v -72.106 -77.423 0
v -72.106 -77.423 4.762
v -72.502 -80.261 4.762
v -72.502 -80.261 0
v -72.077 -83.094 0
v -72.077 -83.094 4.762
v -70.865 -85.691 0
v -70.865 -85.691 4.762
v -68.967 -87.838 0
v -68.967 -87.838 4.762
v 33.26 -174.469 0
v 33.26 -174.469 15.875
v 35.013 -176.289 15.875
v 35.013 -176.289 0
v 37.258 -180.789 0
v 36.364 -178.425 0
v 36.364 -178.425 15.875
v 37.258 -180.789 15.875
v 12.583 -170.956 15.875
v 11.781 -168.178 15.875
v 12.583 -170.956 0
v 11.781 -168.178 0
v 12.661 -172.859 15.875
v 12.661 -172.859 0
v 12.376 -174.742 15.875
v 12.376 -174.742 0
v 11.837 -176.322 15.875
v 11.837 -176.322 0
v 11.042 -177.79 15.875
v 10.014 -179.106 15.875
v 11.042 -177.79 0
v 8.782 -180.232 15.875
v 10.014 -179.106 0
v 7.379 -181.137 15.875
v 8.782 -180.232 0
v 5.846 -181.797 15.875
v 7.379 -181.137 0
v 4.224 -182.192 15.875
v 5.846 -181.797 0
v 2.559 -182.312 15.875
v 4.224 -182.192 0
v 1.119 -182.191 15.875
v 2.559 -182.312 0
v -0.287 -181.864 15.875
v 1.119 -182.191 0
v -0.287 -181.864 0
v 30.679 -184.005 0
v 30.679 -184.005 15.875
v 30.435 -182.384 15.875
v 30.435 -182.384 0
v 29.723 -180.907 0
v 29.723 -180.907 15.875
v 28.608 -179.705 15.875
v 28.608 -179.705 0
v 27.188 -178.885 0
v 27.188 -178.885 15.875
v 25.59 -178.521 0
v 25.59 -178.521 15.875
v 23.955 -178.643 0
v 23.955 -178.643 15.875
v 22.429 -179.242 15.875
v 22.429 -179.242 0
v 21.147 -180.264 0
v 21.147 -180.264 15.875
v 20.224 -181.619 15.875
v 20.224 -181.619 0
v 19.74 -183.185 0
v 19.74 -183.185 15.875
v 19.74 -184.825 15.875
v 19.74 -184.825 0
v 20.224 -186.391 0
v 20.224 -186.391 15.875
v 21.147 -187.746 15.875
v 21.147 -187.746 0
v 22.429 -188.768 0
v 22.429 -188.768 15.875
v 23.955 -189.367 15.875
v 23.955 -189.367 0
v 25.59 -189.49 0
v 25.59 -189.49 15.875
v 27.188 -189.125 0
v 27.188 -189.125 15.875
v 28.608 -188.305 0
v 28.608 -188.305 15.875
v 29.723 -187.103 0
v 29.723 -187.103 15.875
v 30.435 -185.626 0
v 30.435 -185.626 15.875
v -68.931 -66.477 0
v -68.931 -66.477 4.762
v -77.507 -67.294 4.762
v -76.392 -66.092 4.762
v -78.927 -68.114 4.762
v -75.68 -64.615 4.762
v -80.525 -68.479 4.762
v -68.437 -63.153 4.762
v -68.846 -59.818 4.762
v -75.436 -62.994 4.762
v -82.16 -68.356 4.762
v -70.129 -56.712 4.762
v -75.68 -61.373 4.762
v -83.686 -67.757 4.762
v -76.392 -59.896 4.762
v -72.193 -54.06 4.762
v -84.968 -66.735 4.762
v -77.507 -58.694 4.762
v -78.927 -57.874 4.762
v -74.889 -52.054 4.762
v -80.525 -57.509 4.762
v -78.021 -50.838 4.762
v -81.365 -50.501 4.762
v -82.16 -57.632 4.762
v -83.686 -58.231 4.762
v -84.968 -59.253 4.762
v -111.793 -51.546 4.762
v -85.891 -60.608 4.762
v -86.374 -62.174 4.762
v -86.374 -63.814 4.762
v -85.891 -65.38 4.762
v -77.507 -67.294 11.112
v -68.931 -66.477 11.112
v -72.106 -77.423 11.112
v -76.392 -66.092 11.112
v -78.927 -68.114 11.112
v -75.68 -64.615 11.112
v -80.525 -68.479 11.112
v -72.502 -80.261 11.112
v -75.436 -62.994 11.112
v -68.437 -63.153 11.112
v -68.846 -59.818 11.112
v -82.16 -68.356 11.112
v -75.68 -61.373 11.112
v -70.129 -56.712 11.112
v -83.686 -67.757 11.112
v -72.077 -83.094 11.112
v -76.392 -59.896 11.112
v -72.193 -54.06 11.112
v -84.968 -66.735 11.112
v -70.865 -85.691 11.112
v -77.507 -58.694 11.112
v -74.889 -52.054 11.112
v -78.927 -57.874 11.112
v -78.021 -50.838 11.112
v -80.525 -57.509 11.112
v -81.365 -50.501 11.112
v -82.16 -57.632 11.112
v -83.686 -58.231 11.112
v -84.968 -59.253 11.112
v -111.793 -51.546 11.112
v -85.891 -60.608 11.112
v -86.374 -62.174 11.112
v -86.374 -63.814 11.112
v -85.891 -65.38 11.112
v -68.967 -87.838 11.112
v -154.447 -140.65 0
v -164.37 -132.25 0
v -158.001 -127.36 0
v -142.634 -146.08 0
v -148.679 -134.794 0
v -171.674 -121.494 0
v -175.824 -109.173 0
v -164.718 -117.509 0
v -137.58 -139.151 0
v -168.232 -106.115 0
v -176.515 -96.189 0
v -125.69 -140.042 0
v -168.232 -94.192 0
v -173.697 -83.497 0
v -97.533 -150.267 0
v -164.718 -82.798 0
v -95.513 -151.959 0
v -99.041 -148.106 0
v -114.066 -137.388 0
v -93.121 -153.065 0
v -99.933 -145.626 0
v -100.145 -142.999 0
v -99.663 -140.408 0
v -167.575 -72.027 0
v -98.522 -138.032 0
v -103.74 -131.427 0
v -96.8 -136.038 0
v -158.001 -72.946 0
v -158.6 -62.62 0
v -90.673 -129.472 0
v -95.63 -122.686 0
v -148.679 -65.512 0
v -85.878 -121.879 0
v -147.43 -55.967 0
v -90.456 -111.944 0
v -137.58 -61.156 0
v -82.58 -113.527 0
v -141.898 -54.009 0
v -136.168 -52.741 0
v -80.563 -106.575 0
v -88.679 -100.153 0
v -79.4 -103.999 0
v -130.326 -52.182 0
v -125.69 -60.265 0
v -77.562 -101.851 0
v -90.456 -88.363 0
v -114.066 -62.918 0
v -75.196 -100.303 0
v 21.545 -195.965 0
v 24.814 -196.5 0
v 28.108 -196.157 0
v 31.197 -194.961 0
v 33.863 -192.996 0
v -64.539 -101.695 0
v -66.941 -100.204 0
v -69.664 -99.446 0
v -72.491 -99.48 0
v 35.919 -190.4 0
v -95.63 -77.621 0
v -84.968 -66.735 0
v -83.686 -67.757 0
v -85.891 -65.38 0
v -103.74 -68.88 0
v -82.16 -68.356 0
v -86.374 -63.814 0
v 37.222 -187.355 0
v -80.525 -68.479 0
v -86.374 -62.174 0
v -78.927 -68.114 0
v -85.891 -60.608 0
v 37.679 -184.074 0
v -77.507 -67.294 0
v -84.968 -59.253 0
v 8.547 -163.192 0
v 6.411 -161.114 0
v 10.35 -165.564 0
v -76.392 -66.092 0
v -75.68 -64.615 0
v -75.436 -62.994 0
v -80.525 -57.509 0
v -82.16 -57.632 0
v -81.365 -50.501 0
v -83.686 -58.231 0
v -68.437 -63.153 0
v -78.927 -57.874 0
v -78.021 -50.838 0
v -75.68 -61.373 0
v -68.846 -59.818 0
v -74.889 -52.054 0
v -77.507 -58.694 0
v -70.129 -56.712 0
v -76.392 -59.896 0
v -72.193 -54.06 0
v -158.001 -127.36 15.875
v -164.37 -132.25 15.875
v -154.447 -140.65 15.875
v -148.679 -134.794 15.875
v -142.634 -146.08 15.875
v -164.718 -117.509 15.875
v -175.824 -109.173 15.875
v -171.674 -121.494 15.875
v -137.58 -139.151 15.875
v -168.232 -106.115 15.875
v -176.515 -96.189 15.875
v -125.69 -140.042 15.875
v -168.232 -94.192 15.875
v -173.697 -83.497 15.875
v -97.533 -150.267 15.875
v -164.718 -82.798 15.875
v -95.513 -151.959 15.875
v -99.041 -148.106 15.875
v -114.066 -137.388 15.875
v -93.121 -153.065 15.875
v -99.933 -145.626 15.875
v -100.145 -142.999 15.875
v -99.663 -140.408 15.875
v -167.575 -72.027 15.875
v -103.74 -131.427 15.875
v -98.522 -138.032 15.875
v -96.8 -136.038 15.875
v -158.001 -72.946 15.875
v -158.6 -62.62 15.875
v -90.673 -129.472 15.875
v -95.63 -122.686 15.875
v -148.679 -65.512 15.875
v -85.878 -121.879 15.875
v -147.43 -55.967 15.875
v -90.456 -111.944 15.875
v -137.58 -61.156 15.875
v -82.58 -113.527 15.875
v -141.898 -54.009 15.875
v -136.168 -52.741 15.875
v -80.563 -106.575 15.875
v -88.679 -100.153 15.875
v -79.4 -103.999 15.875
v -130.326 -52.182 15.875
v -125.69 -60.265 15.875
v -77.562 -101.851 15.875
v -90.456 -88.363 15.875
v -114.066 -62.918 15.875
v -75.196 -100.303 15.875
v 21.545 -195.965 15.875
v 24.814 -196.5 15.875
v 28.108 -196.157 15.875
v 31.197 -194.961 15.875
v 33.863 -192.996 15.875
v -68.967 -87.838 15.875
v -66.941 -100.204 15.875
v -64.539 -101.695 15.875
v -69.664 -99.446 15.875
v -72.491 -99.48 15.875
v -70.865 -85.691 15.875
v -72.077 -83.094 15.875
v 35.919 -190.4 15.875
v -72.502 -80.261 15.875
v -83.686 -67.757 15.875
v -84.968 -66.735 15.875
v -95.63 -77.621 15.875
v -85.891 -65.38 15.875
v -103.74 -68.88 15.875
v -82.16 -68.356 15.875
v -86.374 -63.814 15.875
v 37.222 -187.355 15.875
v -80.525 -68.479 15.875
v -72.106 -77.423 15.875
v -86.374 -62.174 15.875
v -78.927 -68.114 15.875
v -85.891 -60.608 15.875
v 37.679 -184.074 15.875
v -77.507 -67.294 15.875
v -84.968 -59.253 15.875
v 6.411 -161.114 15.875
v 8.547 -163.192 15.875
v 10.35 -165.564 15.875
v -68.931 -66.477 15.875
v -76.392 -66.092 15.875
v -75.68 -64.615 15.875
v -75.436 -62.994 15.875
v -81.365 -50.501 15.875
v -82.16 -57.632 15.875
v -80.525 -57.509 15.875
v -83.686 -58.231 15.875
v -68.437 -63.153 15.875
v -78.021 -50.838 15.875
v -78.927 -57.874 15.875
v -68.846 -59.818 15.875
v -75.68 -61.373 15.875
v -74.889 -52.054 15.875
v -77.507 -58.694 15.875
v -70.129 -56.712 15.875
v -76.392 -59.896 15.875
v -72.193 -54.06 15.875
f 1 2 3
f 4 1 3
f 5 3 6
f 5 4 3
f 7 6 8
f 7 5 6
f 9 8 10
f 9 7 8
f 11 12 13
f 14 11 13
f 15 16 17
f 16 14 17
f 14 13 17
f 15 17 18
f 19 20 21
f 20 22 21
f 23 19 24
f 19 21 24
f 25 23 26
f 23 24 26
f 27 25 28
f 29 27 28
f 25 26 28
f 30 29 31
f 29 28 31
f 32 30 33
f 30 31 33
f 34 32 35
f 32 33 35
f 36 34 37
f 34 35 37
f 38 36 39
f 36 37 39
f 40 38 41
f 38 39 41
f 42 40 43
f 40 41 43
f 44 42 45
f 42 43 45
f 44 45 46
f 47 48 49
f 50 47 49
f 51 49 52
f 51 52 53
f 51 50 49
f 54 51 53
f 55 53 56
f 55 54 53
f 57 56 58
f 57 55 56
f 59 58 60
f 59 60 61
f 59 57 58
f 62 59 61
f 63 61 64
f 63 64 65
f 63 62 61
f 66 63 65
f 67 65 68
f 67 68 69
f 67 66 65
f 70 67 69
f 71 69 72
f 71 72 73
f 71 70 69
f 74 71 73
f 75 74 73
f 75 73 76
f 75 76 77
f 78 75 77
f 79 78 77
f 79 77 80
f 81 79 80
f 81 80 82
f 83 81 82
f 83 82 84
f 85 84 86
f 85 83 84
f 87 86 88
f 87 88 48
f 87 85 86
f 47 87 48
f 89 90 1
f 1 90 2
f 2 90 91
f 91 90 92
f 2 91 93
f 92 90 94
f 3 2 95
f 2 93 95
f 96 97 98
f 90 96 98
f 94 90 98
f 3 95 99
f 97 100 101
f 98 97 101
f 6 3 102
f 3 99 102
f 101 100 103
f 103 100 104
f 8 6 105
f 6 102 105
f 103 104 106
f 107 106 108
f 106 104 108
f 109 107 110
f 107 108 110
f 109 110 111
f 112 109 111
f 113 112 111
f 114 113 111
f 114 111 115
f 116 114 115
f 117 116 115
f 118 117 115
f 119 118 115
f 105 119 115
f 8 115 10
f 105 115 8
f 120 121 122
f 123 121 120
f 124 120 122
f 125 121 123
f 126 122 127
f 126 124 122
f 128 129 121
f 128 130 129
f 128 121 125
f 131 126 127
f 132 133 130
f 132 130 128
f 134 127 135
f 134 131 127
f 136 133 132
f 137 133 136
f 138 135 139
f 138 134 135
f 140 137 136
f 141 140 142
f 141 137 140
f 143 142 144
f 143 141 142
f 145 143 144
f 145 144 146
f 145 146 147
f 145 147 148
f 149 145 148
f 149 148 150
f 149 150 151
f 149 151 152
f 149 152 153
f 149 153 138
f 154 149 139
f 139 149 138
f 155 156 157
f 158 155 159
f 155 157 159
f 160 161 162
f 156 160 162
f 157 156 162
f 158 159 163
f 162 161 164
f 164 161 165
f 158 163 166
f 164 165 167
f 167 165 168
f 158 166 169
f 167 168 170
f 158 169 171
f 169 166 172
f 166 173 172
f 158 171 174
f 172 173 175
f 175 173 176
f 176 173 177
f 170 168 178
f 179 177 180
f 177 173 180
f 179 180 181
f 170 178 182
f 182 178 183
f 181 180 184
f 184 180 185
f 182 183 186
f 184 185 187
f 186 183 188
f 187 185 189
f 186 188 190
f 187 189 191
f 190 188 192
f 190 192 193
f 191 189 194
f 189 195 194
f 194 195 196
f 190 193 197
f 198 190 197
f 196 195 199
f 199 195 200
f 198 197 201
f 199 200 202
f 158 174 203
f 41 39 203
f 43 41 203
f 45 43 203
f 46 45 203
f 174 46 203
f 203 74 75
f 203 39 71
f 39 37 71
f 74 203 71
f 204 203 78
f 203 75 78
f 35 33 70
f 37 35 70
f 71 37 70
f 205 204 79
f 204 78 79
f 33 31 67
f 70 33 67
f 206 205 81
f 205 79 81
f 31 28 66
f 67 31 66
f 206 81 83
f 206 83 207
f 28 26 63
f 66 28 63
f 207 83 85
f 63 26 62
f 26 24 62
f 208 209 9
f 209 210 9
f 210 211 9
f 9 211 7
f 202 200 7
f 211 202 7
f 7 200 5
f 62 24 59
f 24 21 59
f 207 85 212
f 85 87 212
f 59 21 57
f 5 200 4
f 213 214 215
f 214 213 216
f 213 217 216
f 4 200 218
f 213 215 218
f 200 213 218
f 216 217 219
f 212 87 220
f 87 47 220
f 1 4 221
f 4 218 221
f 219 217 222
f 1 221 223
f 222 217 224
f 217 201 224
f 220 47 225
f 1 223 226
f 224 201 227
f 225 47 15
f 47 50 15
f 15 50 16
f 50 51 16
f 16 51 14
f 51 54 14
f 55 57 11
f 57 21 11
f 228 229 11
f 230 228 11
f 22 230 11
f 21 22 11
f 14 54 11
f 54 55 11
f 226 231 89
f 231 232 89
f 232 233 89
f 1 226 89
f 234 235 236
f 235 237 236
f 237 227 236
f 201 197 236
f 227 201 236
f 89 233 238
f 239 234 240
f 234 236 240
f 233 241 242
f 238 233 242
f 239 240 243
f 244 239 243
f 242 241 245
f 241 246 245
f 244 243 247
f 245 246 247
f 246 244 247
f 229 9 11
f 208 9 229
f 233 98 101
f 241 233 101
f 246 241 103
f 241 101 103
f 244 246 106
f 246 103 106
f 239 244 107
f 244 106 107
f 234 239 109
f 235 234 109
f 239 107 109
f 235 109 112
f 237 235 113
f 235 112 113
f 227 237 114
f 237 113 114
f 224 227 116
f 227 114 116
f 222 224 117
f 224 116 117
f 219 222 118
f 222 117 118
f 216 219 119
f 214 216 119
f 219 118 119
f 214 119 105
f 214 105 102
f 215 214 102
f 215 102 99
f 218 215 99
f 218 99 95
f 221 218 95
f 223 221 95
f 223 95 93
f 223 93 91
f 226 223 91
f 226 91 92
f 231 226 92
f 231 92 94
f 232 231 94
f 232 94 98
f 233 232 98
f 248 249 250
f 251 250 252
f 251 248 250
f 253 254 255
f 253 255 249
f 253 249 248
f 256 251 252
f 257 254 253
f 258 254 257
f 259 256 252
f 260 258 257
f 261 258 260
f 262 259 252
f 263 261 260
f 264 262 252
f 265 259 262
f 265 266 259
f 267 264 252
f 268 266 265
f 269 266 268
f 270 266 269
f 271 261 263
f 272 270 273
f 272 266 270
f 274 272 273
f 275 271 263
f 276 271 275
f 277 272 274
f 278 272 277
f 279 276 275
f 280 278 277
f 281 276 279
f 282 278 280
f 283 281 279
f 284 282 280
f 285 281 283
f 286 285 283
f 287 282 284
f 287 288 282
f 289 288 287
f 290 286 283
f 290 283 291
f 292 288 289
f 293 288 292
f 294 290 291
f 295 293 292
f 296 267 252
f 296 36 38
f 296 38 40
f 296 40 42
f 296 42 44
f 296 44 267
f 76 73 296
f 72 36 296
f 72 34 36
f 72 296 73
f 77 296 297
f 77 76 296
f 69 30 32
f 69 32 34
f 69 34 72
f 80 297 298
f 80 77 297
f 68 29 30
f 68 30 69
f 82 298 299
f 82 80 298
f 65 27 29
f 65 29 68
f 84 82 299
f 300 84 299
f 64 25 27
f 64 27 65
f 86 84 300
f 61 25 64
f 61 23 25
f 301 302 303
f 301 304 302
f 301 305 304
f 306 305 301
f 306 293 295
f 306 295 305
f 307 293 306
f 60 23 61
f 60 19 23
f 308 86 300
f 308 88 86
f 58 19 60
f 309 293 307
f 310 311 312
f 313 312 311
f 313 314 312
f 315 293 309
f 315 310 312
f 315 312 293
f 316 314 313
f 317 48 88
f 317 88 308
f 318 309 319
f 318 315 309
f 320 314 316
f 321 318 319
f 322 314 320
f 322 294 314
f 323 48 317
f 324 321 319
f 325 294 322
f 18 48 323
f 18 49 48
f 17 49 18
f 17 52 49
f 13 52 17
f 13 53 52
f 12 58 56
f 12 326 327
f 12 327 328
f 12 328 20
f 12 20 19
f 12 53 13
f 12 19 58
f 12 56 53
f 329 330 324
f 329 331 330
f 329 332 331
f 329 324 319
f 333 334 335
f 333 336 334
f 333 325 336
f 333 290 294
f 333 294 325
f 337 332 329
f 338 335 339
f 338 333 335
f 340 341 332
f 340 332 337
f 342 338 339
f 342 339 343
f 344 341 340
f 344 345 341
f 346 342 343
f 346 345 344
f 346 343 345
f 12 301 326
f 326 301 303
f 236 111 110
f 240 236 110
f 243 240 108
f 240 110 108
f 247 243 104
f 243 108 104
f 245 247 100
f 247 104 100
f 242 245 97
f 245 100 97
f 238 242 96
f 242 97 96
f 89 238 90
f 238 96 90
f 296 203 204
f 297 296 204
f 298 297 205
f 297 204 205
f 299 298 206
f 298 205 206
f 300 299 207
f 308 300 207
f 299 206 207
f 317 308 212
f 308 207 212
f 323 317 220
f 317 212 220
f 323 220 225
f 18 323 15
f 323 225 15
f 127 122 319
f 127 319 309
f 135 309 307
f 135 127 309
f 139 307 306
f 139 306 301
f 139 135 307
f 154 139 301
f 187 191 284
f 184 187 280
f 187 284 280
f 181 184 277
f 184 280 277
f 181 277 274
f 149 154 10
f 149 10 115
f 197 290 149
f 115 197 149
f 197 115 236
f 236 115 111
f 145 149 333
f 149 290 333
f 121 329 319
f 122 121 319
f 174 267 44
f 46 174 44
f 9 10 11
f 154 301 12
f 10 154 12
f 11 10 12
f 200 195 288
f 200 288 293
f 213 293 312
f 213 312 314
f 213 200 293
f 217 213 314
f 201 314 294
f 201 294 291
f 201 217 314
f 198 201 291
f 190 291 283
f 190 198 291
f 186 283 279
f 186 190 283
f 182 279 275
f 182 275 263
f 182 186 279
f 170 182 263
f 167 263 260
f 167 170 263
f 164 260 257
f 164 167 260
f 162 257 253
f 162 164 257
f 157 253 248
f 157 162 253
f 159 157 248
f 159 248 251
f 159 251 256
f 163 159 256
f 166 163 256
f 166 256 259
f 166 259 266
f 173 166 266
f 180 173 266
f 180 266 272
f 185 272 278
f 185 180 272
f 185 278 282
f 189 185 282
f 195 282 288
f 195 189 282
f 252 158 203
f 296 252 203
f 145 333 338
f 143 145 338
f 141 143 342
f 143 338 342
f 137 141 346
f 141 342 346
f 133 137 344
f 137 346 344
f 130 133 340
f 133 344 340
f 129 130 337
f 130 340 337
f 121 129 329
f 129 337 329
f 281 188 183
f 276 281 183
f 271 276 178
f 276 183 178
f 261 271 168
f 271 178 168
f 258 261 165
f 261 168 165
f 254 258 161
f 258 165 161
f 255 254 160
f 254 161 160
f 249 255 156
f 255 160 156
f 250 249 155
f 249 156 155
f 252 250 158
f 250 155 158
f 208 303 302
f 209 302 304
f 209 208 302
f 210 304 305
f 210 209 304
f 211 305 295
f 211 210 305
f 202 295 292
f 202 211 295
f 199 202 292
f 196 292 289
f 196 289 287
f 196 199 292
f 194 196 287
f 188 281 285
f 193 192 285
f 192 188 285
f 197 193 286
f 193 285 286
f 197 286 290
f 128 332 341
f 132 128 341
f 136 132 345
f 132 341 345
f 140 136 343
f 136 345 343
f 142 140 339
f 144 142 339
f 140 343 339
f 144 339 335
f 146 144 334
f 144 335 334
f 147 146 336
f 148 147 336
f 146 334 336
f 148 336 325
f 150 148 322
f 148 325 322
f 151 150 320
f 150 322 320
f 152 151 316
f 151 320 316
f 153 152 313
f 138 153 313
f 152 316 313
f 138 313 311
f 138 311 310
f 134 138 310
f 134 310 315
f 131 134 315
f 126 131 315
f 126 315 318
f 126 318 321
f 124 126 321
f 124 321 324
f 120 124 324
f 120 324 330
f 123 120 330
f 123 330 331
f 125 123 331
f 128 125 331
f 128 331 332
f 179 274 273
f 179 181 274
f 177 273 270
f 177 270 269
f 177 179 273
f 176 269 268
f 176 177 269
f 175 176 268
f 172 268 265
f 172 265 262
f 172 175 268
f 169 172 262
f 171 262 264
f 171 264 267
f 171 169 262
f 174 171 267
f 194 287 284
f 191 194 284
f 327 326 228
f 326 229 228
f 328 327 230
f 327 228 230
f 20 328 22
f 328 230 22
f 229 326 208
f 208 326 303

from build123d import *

# Parameters (mm, degrees)
SKETCH4_R           = 40
SKETCH4_R_2         = 5.5
BOSS_EXTRUDE1_DEPTH = 15.875
SKETCH5_R           = 5.5
CUT_EXTRUDE2_DEPTH  = 265.729718277
FILLET1_R           = 10
FILLET2_R           = 20
FILLET3_R           = 10
CUT_EXTRUDE3_DEPTH  = 3.175


with BuildPart() as part:
    # Sketch4 → Boss-Extrude1 (new body)
    with BuildSketch(Plane.XY):
        with BuildLine():
            Line((-142.633865887, -146.080164327), (21.544941406, -195.965223983))
            ThreePointArc((21.544941406, -195.965223983), (33.862932788, -192.99616638), (37.258075063, -180.78874144))
            Line((37.258075063, -180.78874144), (-7.649527095, -12.138772571))
            ThreePointArc((-7.649527095, -12.138772571), (-14.239674224, -4.124786339), (-24.611636772, -3.848367419))
            Line((-24.611636772, -3.848367419), (-147.429933804, -55.967315581))
            ThreePointArc((-147.429933804, -55.967315581), (-176.611366682, -102.704491033), (-142.633865887, -146.080164327))
        make_face()
        with Locations((-128.679206861, -100.153402069)):
            Circle(SKETCH4_R, mode=Mode.SUBTRACT)
        with Locations((25.178967194, -184.005129645)):
            Circle(SKETCH4_R_2, mode=Mode.SUBTRACT)
        with Locations((-19.728634964, -15.355160776)):
            Circle(SKETCH4_R_2, mode=Mode.SUBTRACT)
    extrude(amount=BOSS_EXTRUDE1_DEPTH)

    # Sketch5 → Cut-Extrude2 (cut, through all)
    # profile 1 of 3: a face of its own
    with BuildSketch(Plane.XY.offset(15.875)):
        with BuildLine():
            ThreePointArc((-147.429933804, -55.967315581), (-139.051950222, -53.287570217), (-130.325634952, -52.181647103))
            Line((-130.325634952, -52.181647103), (-81.364667563, -50.50126847))
            ThreePointArc((-81.364667563, -50.50126847), (-71.071592766, -55.316332604), (-68.930846466, -66.476504497))
            Line((-68.930846466, -66.476504497), (-73.912035736, -83.647480421))
            Line((-73.912035736, -83.647480421), (33.260347587, -174.468815318))
            ThreePointArc((33.260347587, -174.468815318), (35.742900566, -177.322816295), (37.258075063, -180.78874144))
            Line((37.258075063, -180.78874144), (-7.649527095, -12.138772571))
            ThreePointArc((-7.649527095, -12.138772571), (-14.239674224, -4.124786339), (-24.611636772, -3.848367419))
            Line((-24.611636772, -3.848367419), (-147.429933804, -55.967315581))
        make_face()
        with Locations((-19.728634964, -15.355160776)):
            Circle(SKETCH5_R, mode=Mode.SUBTRACT)
    # profile 2 of 3: a face of its own
    with BuildSketch(Plane.XY.offset(15.875)):
        with BuildLine():
            Line((20.104564205, -172.581450977), (-76.29204815, -91.851773341))
            Line((-76.29204815, -91.851773341), (-82.579761939, -113.52655345))
            ThreePointArc((-82.579761939, -113.52655345), (-94.695070233, -134.05146186), (-115.189187477, -146.218783616))
            Line((-115.189187477, -146.218783616), (12.828423676, -185.932323147))
            ThreePointArc((12.828423676, -185.932323147), (14.203146627, -178.023377153), (20.104564205, -172.581450977))
        make_face()
    # profile 3 of 3: a face of its own
    with BuildSketch(Plane.XY.offset(15.875)):
        with Locations((-80.935910248, -62.993912992)):
            Circle(SKETCH5_R)
    extrude(amount=-CUT_EXTRUDE2_DEPTH, mode=Mode.SUBTRACT)

    # Fillet1
    fillet1_edges = [part.edges().sort_by_distance(p)[0] for p in [
        (-73.912035736, -83.647480421, 7.9375),
        (-115.189187477, -146.218783616, 7.9375),
        (-76.29204815, -91.851773341, 7.9375),
    ]]
    fillet(fillet1_edges, radius=FILLET1_R)

    # Fillet2
    fillet2_edges = [part.edges().sort_by_distance(p)[0] for p in [
        (20.104564205, -172.581450977, 7.9375),
    ]]
    fillet(fillet2_edges, radius=FILLET2_R)

    # Fillet3
    fillet3_edges = [part.edges().sort_by_distance(p)[0] for p in [
        (12.828423676, -185.932323147, 7.9375),
    ]]
    fillet(fillet3_edges, radius=FILLET3_R)

    # Sketch9 → Cut-Extrude3 (cut, symmetric)
    with BuildSketch(Plane.XY.offset(7.9375)):
        Polygon((-61.249571306, -94.378061257), (-111.793381856, -51.545605705), (-96.460931355, -33.452772516), (-45.917120805, -76.285228067), align=None)
    extrude(amount=CUT_EXTRUDE3_DEPTH, both=True, mode=Mode.SUBTRACT)


solid = part.part
